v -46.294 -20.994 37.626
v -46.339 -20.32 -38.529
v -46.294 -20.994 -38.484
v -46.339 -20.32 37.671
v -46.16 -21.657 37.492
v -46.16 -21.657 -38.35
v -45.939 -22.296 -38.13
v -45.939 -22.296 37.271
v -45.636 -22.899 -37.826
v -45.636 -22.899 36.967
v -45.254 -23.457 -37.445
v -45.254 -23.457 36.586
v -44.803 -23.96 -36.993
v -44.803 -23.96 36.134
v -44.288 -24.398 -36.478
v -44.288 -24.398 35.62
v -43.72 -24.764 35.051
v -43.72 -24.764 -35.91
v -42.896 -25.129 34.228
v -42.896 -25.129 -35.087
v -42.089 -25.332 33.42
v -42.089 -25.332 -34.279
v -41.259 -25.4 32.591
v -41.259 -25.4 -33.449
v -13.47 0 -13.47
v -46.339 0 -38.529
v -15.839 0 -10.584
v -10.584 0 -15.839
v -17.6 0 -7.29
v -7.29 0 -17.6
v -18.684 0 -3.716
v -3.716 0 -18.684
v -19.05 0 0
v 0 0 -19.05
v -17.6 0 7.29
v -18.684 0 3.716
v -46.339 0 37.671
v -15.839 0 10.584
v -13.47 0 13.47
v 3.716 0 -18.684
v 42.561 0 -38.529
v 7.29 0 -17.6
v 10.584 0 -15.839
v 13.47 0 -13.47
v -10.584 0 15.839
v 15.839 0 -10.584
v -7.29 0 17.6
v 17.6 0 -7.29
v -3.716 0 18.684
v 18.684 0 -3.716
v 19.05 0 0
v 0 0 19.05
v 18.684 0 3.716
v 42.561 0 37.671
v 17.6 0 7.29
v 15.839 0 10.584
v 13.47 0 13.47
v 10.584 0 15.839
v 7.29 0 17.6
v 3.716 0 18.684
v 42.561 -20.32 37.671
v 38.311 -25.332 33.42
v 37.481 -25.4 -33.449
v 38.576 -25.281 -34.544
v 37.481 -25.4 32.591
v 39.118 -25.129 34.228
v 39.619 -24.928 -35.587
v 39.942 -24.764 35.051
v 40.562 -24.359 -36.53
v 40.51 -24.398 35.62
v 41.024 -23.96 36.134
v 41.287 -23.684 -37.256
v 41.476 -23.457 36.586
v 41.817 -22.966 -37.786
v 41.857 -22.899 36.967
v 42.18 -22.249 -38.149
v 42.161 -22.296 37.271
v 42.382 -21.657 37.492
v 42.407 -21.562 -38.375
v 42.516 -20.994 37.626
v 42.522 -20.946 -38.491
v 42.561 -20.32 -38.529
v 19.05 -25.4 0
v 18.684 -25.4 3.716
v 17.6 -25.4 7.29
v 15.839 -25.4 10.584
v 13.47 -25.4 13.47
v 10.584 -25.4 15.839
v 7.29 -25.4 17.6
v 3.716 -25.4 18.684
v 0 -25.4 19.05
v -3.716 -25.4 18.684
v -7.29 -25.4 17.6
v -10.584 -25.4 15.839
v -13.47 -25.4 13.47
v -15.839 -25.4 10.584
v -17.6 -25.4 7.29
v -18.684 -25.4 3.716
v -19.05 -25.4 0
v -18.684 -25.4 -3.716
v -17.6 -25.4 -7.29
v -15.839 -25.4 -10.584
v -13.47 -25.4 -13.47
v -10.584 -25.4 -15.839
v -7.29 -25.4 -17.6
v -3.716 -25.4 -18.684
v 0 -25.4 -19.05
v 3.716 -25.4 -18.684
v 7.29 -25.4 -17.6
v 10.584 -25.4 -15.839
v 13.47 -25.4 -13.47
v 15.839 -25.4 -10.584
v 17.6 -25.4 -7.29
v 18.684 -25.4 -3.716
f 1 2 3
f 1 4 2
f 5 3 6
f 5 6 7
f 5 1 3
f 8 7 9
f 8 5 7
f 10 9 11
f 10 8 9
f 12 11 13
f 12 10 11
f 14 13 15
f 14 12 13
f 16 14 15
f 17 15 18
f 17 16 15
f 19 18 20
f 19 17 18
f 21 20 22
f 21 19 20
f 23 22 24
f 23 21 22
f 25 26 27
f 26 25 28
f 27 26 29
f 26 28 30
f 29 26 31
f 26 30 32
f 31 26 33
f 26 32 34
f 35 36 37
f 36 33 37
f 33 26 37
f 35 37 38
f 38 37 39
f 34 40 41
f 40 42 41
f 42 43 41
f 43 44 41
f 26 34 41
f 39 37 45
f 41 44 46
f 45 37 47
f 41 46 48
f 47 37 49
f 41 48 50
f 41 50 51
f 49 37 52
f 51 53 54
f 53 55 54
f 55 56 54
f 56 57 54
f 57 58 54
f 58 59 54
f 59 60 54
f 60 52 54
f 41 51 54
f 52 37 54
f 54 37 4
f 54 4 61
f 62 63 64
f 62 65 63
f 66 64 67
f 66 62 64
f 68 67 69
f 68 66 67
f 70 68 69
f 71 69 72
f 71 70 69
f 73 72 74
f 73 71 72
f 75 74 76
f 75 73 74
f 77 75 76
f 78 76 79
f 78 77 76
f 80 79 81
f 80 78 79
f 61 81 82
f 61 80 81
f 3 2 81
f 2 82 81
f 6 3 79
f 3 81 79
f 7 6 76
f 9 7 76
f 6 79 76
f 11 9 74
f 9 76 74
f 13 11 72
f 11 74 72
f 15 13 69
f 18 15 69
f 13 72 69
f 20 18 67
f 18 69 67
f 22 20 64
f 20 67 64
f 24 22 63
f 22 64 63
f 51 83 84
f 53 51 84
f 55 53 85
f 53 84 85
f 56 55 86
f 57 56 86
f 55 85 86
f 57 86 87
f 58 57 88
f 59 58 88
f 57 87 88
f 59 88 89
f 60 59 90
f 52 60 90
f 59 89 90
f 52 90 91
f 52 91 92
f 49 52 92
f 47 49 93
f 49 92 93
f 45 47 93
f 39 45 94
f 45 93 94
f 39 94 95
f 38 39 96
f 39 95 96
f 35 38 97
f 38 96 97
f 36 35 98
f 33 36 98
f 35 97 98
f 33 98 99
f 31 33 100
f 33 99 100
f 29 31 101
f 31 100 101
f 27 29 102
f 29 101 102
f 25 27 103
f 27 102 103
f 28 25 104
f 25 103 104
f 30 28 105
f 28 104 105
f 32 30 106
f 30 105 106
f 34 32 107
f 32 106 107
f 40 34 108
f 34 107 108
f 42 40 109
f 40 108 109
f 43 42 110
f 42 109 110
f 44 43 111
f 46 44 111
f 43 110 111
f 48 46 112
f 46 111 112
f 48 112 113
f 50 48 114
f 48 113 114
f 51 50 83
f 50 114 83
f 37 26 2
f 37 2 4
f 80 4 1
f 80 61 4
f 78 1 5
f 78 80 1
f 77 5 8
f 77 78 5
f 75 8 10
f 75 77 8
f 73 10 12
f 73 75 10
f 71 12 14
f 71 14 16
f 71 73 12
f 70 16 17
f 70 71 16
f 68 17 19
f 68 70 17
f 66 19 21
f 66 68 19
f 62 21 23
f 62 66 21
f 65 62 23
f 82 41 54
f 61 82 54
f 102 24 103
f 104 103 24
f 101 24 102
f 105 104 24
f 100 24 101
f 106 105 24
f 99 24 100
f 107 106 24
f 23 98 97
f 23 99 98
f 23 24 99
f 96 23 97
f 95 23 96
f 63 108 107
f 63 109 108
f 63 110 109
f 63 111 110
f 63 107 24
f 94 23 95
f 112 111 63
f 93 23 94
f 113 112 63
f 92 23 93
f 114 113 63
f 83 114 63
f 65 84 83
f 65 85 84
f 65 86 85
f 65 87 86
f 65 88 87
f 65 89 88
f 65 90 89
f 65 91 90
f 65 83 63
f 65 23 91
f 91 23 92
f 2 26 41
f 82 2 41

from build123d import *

# Parameters (mm, degrees)
F0_W     = 88.9
F0_H     = 76.2
F1_DEPTH = 25.4
F2_R     = 19.05
F3_DEPTH = 25.4
F4_R     = 5.08


with BuildPart() as f1:
    # F0 (on Front) → F1 (new body)
    with BuildSketch(Plane.XZ):
        with Locations((-1.889126, -0.429428)):
            Rectangle(F0_W, F0_H)
    extrude(amount=F1_DEPTH)

    # F2 (on face) → F3 (cut)
    with BuildSketch(Plane.XZ.offset(25.4)):
        Circle(F2_R)
    extrude(amount=-F3_DEPTH, mode=Mode.SUBTRACT)

    # F4
    f4_edges = [f1.edges().sort_by_distance(p)[0] for p in [
        (-46.339126, -25.4, -0.429428),
        (-1.889126, -25.4, 37.670572),
        (42.560874, -25.4, -0.429428),
        (-1.889126, -25.4, -38.529428),
    ]]
    fillet(f4_edges, radius=F4_R)


solid = f1.part
